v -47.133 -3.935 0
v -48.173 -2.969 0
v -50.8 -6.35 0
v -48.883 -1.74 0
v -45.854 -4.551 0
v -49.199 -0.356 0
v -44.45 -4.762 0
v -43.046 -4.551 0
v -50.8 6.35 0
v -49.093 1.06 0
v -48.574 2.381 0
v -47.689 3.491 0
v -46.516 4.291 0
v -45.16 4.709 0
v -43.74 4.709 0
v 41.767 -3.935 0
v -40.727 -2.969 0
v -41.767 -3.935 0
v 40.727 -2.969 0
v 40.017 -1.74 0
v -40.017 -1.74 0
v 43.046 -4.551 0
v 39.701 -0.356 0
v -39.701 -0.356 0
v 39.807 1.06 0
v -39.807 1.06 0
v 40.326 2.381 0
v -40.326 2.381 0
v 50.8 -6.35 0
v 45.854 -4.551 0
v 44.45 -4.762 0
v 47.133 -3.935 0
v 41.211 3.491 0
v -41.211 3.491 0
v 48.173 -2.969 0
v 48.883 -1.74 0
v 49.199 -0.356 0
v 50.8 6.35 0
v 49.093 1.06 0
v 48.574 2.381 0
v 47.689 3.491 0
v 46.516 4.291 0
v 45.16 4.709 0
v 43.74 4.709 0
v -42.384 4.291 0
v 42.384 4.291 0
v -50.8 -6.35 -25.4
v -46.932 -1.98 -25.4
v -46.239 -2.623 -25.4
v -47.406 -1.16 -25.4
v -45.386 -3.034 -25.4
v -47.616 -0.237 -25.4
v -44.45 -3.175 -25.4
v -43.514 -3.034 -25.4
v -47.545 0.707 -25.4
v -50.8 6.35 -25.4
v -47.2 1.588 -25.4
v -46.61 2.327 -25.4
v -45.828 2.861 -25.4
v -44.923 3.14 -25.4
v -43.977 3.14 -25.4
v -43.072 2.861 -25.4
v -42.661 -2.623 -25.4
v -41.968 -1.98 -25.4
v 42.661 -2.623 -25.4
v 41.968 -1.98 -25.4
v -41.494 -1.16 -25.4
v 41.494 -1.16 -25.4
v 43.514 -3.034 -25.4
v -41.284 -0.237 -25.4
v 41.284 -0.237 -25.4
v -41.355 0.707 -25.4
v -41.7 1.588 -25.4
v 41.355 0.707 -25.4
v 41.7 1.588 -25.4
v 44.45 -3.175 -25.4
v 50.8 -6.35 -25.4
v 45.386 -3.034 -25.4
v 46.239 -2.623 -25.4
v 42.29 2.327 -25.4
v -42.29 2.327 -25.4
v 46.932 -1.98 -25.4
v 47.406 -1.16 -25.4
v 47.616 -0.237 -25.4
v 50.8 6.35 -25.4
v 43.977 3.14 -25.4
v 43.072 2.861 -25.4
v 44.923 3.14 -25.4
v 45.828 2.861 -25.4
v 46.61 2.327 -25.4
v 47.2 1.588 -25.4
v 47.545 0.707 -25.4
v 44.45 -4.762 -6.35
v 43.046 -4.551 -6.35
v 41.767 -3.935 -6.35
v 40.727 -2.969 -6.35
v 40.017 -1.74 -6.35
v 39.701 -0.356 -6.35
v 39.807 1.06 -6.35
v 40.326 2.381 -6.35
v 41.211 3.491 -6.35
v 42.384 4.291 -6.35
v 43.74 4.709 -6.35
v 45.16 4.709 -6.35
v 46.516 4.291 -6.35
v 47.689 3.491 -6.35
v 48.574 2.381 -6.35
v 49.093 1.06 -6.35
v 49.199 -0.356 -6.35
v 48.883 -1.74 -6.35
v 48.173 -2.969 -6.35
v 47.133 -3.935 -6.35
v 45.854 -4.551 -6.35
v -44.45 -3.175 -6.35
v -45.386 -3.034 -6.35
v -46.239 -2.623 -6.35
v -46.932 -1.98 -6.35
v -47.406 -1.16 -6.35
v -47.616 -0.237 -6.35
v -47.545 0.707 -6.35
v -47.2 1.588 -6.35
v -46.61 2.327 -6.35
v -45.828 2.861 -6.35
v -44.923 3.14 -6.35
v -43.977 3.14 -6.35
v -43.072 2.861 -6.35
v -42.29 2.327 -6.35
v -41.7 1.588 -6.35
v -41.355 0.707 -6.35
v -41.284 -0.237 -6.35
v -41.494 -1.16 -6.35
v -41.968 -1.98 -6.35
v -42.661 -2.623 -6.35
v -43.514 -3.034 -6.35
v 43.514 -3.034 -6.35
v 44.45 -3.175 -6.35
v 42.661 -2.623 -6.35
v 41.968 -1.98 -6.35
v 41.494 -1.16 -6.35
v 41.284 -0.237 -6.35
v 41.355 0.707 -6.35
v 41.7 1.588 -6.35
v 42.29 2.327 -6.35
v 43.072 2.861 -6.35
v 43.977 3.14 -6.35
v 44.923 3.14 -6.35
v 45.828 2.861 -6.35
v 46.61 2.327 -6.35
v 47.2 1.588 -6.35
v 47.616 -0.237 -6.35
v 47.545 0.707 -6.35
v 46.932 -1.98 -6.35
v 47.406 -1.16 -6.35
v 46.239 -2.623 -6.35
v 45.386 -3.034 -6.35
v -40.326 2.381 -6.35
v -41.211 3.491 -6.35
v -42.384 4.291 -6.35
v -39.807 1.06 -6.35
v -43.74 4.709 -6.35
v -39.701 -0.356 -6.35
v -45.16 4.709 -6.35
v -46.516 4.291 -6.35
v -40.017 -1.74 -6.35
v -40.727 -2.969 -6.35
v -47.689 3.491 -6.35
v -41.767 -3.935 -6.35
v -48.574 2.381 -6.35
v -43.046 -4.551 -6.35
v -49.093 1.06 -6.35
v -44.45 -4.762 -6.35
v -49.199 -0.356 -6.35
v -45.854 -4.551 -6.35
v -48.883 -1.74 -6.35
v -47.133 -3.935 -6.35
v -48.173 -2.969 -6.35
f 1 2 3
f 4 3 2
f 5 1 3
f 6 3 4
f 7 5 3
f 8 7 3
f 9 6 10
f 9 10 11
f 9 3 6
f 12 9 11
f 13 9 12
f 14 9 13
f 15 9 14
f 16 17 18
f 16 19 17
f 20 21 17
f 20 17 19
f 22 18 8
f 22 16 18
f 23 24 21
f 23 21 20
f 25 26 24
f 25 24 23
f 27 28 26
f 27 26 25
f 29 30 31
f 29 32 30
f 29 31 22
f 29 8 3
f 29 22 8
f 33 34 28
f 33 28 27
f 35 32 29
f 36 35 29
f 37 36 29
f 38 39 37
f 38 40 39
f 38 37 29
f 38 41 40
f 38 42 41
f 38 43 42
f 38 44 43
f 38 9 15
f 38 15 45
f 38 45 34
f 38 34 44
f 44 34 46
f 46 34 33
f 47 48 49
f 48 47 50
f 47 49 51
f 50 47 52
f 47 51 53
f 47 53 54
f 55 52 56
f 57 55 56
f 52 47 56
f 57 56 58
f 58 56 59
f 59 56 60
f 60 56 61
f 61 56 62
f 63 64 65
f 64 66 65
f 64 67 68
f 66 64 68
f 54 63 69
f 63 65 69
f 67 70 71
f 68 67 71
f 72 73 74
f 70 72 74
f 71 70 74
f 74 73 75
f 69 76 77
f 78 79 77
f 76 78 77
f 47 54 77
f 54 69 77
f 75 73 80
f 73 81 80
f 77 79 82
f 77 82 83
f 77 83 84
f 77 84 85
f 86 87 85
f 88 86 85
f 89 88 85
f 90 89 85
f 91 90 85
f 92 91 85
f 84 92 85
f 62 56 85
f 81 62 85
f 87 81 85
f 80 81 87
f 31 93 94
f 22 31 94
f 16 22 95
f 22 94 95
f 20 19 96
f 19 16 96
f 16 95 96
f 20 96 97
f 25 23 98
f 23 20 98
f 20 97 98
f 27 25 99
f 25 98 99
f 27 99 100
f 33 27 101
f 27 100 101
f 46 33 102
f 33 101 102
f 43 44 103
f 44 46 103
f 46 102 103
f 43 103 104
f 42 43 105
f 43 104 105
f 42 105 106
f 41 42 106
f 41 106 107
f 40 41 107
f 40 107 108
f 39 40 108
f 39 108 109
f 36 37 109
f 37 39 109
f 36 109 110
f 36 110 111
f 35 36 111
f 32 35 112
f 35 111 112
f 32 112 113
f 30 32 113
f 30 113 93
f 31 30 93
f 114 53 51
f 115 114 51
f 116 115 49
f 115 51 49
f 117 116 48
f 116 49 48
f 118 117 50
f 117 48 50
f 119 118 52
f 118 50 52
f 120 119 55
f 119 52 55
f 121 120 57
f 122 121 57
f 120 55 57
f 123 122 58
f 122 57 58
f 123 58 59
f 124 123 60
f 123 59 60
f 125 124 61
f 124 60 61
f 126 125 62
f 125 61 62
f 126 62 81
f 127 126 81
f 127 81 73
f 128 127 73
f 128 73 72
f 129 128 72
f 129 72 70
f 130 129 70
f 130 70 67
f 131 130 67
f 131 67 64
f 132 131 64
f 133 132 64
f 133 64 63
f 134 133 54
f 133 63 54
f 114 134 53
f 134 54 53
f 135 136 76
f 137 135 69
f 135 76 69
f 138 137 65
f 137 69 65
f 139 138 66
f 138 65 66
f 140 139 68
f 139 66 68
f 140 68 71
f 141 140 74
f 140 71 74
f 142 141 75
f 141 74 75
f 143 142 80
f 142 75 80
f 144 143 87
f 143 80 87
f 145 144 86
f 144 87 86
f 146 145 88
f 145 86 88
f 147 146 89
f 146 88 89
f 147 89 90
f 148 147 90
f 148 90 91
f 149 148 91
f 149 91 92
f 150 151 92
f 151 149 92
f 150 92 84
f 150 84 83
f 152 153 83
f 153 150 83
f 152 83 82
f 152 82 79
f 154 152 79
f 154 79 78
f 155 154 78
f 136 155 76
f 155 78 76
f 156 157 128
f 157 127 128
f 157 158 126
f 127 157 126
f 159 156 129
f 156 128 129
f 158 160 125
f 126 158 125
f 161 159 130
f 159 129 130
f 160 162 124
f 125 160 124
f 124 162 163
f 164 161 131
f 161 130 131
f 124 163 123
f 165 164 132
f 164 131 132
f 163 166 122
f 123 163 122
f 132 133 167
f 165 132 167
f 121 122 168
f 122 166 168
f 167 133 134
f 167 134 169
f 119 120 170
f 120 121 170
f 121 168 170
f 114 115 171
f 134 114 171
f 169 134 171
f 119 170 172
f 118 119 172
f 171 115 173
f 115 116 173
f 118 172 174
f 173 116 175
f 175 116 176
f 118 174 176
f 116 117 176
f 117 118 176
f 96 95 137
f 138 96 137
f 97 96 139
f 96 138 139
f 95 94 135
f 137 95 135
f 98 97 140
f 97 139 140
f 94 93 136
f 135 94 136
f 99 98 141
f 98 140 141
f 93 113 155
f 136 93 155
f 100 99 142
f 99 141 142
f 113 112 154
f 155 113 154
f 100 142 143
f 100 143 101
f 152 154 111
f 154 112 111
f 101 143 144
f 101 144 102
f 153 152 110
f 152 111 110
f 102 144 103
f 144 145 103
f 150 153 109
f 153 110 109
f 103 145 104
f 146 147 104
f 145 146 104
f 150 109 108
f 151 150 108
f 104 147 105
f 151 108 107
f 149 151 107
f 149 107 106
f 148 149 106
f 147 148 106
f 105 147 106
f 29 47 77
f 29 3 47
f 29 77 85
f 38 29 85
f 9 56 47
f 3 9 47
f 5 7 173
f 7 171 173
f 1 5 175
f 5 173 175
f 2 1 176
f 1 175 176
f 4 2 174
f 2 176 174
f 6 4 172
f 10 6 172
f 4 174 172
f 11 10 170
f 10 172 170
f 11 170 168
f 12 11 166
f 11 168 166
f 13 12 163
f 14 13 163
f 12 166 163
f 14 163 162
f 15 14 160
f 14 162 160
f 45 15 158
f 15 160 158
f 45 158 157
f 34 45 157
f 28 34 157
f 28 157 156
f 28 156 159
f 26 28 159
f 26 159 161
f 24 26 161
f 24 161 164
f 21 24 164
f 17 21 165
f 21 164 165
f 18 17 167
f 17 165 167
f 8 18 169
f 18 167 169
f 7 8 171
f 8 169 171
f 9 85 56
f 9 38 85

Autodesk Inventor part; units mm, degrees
ref_plane "YZ Plane" through (0, 0, 0) normal (1, 0, 0) x (0, 1, 0)
ref_plane "XZ Plane" through (0, 0, 0) normal (0, 1, 0) x (-1, 0, 0)
ref_plane "XY Plane" through (0, 0, 0) normal (0, 0, 1) x (1, 0, 0)
sketch "Sketch1" plane through (0, 0, 0) normal (0, 0, 1) x (1, 0, 0)
  line L0 (50.8, 6.35) -> (-50.8, 6.35)
  line L1 (-50.8, 6.35) -> (-50.8, -6.35)
  line L2 (-50.8, -6.35) -> (50.8, -6.35)
  line L3 (50.8, -6.35) -> (50.8, 6.35)
  line L4 (50.8, 6.35) -> (-50.8, -6.35) construction
  line L5 (-50.8, 6.35) -> (50.8, -6.35) construction
  point P0 (0, 0)
  dimension "d0" = 101.6
  dimension "d1" = 12.7
extrude "Extrusion1" add sketch "Sketch1" against normal blind 25.4
sketch "Sketch2" plane through (0, 0, 0) normal (0, 0, 1) x (1, 0, 0)
  line L0 (-71.12, 0) -> (71.12, 0) projected
  line L1 (0, -8.89) -> (0, 8.89) projected
  line L2 (-50.8, 6.35) -> (-50.8, -6.35) projected
  line L3 (-50.8, -6.35) -> (50.8, -6.35) projected
  line L4 (50.8, -6.35) -> (50.8, 6.35) projected
  line L5 (50.8, 6.35) -> (-50.8, 6.35) projected
  point P0 (0, 0)
  point P1 (-44.45, 0)
  dimension "d5" = 44.45
hole "Hole1" at (-44.45, 0, 0) direction (0, 0, -1) diameter 6.35 end through all counterbore diameter 9.525 counterbore depth 6.35
mirror "Mirror1" about plane through (0, 0, 0) normal (1, 0, 0) of "Hole1"
equation "\"d11\" = Thickness"
equation "\"BendRadius\" = Thickness"
equation "\"BendReliefWidth\" = Thickness"
equation "\"BendReliefDepth\" = 0.5 * Thickness"
equation "\"CornerReliefSize\" = 4 * Thickness"
equation "\"MinimumRemnant\" = 2 * Thickness"
equation "\"TransitionRadius\" = BendRadius"
equation "\"JacobiRadiusSize\" = BendRadius"
equation "\"GapSize\" = Thickness"
equation "\"Thickness\" = 3.048"
properties part number "3DPrintedFrameBackingPlate"
